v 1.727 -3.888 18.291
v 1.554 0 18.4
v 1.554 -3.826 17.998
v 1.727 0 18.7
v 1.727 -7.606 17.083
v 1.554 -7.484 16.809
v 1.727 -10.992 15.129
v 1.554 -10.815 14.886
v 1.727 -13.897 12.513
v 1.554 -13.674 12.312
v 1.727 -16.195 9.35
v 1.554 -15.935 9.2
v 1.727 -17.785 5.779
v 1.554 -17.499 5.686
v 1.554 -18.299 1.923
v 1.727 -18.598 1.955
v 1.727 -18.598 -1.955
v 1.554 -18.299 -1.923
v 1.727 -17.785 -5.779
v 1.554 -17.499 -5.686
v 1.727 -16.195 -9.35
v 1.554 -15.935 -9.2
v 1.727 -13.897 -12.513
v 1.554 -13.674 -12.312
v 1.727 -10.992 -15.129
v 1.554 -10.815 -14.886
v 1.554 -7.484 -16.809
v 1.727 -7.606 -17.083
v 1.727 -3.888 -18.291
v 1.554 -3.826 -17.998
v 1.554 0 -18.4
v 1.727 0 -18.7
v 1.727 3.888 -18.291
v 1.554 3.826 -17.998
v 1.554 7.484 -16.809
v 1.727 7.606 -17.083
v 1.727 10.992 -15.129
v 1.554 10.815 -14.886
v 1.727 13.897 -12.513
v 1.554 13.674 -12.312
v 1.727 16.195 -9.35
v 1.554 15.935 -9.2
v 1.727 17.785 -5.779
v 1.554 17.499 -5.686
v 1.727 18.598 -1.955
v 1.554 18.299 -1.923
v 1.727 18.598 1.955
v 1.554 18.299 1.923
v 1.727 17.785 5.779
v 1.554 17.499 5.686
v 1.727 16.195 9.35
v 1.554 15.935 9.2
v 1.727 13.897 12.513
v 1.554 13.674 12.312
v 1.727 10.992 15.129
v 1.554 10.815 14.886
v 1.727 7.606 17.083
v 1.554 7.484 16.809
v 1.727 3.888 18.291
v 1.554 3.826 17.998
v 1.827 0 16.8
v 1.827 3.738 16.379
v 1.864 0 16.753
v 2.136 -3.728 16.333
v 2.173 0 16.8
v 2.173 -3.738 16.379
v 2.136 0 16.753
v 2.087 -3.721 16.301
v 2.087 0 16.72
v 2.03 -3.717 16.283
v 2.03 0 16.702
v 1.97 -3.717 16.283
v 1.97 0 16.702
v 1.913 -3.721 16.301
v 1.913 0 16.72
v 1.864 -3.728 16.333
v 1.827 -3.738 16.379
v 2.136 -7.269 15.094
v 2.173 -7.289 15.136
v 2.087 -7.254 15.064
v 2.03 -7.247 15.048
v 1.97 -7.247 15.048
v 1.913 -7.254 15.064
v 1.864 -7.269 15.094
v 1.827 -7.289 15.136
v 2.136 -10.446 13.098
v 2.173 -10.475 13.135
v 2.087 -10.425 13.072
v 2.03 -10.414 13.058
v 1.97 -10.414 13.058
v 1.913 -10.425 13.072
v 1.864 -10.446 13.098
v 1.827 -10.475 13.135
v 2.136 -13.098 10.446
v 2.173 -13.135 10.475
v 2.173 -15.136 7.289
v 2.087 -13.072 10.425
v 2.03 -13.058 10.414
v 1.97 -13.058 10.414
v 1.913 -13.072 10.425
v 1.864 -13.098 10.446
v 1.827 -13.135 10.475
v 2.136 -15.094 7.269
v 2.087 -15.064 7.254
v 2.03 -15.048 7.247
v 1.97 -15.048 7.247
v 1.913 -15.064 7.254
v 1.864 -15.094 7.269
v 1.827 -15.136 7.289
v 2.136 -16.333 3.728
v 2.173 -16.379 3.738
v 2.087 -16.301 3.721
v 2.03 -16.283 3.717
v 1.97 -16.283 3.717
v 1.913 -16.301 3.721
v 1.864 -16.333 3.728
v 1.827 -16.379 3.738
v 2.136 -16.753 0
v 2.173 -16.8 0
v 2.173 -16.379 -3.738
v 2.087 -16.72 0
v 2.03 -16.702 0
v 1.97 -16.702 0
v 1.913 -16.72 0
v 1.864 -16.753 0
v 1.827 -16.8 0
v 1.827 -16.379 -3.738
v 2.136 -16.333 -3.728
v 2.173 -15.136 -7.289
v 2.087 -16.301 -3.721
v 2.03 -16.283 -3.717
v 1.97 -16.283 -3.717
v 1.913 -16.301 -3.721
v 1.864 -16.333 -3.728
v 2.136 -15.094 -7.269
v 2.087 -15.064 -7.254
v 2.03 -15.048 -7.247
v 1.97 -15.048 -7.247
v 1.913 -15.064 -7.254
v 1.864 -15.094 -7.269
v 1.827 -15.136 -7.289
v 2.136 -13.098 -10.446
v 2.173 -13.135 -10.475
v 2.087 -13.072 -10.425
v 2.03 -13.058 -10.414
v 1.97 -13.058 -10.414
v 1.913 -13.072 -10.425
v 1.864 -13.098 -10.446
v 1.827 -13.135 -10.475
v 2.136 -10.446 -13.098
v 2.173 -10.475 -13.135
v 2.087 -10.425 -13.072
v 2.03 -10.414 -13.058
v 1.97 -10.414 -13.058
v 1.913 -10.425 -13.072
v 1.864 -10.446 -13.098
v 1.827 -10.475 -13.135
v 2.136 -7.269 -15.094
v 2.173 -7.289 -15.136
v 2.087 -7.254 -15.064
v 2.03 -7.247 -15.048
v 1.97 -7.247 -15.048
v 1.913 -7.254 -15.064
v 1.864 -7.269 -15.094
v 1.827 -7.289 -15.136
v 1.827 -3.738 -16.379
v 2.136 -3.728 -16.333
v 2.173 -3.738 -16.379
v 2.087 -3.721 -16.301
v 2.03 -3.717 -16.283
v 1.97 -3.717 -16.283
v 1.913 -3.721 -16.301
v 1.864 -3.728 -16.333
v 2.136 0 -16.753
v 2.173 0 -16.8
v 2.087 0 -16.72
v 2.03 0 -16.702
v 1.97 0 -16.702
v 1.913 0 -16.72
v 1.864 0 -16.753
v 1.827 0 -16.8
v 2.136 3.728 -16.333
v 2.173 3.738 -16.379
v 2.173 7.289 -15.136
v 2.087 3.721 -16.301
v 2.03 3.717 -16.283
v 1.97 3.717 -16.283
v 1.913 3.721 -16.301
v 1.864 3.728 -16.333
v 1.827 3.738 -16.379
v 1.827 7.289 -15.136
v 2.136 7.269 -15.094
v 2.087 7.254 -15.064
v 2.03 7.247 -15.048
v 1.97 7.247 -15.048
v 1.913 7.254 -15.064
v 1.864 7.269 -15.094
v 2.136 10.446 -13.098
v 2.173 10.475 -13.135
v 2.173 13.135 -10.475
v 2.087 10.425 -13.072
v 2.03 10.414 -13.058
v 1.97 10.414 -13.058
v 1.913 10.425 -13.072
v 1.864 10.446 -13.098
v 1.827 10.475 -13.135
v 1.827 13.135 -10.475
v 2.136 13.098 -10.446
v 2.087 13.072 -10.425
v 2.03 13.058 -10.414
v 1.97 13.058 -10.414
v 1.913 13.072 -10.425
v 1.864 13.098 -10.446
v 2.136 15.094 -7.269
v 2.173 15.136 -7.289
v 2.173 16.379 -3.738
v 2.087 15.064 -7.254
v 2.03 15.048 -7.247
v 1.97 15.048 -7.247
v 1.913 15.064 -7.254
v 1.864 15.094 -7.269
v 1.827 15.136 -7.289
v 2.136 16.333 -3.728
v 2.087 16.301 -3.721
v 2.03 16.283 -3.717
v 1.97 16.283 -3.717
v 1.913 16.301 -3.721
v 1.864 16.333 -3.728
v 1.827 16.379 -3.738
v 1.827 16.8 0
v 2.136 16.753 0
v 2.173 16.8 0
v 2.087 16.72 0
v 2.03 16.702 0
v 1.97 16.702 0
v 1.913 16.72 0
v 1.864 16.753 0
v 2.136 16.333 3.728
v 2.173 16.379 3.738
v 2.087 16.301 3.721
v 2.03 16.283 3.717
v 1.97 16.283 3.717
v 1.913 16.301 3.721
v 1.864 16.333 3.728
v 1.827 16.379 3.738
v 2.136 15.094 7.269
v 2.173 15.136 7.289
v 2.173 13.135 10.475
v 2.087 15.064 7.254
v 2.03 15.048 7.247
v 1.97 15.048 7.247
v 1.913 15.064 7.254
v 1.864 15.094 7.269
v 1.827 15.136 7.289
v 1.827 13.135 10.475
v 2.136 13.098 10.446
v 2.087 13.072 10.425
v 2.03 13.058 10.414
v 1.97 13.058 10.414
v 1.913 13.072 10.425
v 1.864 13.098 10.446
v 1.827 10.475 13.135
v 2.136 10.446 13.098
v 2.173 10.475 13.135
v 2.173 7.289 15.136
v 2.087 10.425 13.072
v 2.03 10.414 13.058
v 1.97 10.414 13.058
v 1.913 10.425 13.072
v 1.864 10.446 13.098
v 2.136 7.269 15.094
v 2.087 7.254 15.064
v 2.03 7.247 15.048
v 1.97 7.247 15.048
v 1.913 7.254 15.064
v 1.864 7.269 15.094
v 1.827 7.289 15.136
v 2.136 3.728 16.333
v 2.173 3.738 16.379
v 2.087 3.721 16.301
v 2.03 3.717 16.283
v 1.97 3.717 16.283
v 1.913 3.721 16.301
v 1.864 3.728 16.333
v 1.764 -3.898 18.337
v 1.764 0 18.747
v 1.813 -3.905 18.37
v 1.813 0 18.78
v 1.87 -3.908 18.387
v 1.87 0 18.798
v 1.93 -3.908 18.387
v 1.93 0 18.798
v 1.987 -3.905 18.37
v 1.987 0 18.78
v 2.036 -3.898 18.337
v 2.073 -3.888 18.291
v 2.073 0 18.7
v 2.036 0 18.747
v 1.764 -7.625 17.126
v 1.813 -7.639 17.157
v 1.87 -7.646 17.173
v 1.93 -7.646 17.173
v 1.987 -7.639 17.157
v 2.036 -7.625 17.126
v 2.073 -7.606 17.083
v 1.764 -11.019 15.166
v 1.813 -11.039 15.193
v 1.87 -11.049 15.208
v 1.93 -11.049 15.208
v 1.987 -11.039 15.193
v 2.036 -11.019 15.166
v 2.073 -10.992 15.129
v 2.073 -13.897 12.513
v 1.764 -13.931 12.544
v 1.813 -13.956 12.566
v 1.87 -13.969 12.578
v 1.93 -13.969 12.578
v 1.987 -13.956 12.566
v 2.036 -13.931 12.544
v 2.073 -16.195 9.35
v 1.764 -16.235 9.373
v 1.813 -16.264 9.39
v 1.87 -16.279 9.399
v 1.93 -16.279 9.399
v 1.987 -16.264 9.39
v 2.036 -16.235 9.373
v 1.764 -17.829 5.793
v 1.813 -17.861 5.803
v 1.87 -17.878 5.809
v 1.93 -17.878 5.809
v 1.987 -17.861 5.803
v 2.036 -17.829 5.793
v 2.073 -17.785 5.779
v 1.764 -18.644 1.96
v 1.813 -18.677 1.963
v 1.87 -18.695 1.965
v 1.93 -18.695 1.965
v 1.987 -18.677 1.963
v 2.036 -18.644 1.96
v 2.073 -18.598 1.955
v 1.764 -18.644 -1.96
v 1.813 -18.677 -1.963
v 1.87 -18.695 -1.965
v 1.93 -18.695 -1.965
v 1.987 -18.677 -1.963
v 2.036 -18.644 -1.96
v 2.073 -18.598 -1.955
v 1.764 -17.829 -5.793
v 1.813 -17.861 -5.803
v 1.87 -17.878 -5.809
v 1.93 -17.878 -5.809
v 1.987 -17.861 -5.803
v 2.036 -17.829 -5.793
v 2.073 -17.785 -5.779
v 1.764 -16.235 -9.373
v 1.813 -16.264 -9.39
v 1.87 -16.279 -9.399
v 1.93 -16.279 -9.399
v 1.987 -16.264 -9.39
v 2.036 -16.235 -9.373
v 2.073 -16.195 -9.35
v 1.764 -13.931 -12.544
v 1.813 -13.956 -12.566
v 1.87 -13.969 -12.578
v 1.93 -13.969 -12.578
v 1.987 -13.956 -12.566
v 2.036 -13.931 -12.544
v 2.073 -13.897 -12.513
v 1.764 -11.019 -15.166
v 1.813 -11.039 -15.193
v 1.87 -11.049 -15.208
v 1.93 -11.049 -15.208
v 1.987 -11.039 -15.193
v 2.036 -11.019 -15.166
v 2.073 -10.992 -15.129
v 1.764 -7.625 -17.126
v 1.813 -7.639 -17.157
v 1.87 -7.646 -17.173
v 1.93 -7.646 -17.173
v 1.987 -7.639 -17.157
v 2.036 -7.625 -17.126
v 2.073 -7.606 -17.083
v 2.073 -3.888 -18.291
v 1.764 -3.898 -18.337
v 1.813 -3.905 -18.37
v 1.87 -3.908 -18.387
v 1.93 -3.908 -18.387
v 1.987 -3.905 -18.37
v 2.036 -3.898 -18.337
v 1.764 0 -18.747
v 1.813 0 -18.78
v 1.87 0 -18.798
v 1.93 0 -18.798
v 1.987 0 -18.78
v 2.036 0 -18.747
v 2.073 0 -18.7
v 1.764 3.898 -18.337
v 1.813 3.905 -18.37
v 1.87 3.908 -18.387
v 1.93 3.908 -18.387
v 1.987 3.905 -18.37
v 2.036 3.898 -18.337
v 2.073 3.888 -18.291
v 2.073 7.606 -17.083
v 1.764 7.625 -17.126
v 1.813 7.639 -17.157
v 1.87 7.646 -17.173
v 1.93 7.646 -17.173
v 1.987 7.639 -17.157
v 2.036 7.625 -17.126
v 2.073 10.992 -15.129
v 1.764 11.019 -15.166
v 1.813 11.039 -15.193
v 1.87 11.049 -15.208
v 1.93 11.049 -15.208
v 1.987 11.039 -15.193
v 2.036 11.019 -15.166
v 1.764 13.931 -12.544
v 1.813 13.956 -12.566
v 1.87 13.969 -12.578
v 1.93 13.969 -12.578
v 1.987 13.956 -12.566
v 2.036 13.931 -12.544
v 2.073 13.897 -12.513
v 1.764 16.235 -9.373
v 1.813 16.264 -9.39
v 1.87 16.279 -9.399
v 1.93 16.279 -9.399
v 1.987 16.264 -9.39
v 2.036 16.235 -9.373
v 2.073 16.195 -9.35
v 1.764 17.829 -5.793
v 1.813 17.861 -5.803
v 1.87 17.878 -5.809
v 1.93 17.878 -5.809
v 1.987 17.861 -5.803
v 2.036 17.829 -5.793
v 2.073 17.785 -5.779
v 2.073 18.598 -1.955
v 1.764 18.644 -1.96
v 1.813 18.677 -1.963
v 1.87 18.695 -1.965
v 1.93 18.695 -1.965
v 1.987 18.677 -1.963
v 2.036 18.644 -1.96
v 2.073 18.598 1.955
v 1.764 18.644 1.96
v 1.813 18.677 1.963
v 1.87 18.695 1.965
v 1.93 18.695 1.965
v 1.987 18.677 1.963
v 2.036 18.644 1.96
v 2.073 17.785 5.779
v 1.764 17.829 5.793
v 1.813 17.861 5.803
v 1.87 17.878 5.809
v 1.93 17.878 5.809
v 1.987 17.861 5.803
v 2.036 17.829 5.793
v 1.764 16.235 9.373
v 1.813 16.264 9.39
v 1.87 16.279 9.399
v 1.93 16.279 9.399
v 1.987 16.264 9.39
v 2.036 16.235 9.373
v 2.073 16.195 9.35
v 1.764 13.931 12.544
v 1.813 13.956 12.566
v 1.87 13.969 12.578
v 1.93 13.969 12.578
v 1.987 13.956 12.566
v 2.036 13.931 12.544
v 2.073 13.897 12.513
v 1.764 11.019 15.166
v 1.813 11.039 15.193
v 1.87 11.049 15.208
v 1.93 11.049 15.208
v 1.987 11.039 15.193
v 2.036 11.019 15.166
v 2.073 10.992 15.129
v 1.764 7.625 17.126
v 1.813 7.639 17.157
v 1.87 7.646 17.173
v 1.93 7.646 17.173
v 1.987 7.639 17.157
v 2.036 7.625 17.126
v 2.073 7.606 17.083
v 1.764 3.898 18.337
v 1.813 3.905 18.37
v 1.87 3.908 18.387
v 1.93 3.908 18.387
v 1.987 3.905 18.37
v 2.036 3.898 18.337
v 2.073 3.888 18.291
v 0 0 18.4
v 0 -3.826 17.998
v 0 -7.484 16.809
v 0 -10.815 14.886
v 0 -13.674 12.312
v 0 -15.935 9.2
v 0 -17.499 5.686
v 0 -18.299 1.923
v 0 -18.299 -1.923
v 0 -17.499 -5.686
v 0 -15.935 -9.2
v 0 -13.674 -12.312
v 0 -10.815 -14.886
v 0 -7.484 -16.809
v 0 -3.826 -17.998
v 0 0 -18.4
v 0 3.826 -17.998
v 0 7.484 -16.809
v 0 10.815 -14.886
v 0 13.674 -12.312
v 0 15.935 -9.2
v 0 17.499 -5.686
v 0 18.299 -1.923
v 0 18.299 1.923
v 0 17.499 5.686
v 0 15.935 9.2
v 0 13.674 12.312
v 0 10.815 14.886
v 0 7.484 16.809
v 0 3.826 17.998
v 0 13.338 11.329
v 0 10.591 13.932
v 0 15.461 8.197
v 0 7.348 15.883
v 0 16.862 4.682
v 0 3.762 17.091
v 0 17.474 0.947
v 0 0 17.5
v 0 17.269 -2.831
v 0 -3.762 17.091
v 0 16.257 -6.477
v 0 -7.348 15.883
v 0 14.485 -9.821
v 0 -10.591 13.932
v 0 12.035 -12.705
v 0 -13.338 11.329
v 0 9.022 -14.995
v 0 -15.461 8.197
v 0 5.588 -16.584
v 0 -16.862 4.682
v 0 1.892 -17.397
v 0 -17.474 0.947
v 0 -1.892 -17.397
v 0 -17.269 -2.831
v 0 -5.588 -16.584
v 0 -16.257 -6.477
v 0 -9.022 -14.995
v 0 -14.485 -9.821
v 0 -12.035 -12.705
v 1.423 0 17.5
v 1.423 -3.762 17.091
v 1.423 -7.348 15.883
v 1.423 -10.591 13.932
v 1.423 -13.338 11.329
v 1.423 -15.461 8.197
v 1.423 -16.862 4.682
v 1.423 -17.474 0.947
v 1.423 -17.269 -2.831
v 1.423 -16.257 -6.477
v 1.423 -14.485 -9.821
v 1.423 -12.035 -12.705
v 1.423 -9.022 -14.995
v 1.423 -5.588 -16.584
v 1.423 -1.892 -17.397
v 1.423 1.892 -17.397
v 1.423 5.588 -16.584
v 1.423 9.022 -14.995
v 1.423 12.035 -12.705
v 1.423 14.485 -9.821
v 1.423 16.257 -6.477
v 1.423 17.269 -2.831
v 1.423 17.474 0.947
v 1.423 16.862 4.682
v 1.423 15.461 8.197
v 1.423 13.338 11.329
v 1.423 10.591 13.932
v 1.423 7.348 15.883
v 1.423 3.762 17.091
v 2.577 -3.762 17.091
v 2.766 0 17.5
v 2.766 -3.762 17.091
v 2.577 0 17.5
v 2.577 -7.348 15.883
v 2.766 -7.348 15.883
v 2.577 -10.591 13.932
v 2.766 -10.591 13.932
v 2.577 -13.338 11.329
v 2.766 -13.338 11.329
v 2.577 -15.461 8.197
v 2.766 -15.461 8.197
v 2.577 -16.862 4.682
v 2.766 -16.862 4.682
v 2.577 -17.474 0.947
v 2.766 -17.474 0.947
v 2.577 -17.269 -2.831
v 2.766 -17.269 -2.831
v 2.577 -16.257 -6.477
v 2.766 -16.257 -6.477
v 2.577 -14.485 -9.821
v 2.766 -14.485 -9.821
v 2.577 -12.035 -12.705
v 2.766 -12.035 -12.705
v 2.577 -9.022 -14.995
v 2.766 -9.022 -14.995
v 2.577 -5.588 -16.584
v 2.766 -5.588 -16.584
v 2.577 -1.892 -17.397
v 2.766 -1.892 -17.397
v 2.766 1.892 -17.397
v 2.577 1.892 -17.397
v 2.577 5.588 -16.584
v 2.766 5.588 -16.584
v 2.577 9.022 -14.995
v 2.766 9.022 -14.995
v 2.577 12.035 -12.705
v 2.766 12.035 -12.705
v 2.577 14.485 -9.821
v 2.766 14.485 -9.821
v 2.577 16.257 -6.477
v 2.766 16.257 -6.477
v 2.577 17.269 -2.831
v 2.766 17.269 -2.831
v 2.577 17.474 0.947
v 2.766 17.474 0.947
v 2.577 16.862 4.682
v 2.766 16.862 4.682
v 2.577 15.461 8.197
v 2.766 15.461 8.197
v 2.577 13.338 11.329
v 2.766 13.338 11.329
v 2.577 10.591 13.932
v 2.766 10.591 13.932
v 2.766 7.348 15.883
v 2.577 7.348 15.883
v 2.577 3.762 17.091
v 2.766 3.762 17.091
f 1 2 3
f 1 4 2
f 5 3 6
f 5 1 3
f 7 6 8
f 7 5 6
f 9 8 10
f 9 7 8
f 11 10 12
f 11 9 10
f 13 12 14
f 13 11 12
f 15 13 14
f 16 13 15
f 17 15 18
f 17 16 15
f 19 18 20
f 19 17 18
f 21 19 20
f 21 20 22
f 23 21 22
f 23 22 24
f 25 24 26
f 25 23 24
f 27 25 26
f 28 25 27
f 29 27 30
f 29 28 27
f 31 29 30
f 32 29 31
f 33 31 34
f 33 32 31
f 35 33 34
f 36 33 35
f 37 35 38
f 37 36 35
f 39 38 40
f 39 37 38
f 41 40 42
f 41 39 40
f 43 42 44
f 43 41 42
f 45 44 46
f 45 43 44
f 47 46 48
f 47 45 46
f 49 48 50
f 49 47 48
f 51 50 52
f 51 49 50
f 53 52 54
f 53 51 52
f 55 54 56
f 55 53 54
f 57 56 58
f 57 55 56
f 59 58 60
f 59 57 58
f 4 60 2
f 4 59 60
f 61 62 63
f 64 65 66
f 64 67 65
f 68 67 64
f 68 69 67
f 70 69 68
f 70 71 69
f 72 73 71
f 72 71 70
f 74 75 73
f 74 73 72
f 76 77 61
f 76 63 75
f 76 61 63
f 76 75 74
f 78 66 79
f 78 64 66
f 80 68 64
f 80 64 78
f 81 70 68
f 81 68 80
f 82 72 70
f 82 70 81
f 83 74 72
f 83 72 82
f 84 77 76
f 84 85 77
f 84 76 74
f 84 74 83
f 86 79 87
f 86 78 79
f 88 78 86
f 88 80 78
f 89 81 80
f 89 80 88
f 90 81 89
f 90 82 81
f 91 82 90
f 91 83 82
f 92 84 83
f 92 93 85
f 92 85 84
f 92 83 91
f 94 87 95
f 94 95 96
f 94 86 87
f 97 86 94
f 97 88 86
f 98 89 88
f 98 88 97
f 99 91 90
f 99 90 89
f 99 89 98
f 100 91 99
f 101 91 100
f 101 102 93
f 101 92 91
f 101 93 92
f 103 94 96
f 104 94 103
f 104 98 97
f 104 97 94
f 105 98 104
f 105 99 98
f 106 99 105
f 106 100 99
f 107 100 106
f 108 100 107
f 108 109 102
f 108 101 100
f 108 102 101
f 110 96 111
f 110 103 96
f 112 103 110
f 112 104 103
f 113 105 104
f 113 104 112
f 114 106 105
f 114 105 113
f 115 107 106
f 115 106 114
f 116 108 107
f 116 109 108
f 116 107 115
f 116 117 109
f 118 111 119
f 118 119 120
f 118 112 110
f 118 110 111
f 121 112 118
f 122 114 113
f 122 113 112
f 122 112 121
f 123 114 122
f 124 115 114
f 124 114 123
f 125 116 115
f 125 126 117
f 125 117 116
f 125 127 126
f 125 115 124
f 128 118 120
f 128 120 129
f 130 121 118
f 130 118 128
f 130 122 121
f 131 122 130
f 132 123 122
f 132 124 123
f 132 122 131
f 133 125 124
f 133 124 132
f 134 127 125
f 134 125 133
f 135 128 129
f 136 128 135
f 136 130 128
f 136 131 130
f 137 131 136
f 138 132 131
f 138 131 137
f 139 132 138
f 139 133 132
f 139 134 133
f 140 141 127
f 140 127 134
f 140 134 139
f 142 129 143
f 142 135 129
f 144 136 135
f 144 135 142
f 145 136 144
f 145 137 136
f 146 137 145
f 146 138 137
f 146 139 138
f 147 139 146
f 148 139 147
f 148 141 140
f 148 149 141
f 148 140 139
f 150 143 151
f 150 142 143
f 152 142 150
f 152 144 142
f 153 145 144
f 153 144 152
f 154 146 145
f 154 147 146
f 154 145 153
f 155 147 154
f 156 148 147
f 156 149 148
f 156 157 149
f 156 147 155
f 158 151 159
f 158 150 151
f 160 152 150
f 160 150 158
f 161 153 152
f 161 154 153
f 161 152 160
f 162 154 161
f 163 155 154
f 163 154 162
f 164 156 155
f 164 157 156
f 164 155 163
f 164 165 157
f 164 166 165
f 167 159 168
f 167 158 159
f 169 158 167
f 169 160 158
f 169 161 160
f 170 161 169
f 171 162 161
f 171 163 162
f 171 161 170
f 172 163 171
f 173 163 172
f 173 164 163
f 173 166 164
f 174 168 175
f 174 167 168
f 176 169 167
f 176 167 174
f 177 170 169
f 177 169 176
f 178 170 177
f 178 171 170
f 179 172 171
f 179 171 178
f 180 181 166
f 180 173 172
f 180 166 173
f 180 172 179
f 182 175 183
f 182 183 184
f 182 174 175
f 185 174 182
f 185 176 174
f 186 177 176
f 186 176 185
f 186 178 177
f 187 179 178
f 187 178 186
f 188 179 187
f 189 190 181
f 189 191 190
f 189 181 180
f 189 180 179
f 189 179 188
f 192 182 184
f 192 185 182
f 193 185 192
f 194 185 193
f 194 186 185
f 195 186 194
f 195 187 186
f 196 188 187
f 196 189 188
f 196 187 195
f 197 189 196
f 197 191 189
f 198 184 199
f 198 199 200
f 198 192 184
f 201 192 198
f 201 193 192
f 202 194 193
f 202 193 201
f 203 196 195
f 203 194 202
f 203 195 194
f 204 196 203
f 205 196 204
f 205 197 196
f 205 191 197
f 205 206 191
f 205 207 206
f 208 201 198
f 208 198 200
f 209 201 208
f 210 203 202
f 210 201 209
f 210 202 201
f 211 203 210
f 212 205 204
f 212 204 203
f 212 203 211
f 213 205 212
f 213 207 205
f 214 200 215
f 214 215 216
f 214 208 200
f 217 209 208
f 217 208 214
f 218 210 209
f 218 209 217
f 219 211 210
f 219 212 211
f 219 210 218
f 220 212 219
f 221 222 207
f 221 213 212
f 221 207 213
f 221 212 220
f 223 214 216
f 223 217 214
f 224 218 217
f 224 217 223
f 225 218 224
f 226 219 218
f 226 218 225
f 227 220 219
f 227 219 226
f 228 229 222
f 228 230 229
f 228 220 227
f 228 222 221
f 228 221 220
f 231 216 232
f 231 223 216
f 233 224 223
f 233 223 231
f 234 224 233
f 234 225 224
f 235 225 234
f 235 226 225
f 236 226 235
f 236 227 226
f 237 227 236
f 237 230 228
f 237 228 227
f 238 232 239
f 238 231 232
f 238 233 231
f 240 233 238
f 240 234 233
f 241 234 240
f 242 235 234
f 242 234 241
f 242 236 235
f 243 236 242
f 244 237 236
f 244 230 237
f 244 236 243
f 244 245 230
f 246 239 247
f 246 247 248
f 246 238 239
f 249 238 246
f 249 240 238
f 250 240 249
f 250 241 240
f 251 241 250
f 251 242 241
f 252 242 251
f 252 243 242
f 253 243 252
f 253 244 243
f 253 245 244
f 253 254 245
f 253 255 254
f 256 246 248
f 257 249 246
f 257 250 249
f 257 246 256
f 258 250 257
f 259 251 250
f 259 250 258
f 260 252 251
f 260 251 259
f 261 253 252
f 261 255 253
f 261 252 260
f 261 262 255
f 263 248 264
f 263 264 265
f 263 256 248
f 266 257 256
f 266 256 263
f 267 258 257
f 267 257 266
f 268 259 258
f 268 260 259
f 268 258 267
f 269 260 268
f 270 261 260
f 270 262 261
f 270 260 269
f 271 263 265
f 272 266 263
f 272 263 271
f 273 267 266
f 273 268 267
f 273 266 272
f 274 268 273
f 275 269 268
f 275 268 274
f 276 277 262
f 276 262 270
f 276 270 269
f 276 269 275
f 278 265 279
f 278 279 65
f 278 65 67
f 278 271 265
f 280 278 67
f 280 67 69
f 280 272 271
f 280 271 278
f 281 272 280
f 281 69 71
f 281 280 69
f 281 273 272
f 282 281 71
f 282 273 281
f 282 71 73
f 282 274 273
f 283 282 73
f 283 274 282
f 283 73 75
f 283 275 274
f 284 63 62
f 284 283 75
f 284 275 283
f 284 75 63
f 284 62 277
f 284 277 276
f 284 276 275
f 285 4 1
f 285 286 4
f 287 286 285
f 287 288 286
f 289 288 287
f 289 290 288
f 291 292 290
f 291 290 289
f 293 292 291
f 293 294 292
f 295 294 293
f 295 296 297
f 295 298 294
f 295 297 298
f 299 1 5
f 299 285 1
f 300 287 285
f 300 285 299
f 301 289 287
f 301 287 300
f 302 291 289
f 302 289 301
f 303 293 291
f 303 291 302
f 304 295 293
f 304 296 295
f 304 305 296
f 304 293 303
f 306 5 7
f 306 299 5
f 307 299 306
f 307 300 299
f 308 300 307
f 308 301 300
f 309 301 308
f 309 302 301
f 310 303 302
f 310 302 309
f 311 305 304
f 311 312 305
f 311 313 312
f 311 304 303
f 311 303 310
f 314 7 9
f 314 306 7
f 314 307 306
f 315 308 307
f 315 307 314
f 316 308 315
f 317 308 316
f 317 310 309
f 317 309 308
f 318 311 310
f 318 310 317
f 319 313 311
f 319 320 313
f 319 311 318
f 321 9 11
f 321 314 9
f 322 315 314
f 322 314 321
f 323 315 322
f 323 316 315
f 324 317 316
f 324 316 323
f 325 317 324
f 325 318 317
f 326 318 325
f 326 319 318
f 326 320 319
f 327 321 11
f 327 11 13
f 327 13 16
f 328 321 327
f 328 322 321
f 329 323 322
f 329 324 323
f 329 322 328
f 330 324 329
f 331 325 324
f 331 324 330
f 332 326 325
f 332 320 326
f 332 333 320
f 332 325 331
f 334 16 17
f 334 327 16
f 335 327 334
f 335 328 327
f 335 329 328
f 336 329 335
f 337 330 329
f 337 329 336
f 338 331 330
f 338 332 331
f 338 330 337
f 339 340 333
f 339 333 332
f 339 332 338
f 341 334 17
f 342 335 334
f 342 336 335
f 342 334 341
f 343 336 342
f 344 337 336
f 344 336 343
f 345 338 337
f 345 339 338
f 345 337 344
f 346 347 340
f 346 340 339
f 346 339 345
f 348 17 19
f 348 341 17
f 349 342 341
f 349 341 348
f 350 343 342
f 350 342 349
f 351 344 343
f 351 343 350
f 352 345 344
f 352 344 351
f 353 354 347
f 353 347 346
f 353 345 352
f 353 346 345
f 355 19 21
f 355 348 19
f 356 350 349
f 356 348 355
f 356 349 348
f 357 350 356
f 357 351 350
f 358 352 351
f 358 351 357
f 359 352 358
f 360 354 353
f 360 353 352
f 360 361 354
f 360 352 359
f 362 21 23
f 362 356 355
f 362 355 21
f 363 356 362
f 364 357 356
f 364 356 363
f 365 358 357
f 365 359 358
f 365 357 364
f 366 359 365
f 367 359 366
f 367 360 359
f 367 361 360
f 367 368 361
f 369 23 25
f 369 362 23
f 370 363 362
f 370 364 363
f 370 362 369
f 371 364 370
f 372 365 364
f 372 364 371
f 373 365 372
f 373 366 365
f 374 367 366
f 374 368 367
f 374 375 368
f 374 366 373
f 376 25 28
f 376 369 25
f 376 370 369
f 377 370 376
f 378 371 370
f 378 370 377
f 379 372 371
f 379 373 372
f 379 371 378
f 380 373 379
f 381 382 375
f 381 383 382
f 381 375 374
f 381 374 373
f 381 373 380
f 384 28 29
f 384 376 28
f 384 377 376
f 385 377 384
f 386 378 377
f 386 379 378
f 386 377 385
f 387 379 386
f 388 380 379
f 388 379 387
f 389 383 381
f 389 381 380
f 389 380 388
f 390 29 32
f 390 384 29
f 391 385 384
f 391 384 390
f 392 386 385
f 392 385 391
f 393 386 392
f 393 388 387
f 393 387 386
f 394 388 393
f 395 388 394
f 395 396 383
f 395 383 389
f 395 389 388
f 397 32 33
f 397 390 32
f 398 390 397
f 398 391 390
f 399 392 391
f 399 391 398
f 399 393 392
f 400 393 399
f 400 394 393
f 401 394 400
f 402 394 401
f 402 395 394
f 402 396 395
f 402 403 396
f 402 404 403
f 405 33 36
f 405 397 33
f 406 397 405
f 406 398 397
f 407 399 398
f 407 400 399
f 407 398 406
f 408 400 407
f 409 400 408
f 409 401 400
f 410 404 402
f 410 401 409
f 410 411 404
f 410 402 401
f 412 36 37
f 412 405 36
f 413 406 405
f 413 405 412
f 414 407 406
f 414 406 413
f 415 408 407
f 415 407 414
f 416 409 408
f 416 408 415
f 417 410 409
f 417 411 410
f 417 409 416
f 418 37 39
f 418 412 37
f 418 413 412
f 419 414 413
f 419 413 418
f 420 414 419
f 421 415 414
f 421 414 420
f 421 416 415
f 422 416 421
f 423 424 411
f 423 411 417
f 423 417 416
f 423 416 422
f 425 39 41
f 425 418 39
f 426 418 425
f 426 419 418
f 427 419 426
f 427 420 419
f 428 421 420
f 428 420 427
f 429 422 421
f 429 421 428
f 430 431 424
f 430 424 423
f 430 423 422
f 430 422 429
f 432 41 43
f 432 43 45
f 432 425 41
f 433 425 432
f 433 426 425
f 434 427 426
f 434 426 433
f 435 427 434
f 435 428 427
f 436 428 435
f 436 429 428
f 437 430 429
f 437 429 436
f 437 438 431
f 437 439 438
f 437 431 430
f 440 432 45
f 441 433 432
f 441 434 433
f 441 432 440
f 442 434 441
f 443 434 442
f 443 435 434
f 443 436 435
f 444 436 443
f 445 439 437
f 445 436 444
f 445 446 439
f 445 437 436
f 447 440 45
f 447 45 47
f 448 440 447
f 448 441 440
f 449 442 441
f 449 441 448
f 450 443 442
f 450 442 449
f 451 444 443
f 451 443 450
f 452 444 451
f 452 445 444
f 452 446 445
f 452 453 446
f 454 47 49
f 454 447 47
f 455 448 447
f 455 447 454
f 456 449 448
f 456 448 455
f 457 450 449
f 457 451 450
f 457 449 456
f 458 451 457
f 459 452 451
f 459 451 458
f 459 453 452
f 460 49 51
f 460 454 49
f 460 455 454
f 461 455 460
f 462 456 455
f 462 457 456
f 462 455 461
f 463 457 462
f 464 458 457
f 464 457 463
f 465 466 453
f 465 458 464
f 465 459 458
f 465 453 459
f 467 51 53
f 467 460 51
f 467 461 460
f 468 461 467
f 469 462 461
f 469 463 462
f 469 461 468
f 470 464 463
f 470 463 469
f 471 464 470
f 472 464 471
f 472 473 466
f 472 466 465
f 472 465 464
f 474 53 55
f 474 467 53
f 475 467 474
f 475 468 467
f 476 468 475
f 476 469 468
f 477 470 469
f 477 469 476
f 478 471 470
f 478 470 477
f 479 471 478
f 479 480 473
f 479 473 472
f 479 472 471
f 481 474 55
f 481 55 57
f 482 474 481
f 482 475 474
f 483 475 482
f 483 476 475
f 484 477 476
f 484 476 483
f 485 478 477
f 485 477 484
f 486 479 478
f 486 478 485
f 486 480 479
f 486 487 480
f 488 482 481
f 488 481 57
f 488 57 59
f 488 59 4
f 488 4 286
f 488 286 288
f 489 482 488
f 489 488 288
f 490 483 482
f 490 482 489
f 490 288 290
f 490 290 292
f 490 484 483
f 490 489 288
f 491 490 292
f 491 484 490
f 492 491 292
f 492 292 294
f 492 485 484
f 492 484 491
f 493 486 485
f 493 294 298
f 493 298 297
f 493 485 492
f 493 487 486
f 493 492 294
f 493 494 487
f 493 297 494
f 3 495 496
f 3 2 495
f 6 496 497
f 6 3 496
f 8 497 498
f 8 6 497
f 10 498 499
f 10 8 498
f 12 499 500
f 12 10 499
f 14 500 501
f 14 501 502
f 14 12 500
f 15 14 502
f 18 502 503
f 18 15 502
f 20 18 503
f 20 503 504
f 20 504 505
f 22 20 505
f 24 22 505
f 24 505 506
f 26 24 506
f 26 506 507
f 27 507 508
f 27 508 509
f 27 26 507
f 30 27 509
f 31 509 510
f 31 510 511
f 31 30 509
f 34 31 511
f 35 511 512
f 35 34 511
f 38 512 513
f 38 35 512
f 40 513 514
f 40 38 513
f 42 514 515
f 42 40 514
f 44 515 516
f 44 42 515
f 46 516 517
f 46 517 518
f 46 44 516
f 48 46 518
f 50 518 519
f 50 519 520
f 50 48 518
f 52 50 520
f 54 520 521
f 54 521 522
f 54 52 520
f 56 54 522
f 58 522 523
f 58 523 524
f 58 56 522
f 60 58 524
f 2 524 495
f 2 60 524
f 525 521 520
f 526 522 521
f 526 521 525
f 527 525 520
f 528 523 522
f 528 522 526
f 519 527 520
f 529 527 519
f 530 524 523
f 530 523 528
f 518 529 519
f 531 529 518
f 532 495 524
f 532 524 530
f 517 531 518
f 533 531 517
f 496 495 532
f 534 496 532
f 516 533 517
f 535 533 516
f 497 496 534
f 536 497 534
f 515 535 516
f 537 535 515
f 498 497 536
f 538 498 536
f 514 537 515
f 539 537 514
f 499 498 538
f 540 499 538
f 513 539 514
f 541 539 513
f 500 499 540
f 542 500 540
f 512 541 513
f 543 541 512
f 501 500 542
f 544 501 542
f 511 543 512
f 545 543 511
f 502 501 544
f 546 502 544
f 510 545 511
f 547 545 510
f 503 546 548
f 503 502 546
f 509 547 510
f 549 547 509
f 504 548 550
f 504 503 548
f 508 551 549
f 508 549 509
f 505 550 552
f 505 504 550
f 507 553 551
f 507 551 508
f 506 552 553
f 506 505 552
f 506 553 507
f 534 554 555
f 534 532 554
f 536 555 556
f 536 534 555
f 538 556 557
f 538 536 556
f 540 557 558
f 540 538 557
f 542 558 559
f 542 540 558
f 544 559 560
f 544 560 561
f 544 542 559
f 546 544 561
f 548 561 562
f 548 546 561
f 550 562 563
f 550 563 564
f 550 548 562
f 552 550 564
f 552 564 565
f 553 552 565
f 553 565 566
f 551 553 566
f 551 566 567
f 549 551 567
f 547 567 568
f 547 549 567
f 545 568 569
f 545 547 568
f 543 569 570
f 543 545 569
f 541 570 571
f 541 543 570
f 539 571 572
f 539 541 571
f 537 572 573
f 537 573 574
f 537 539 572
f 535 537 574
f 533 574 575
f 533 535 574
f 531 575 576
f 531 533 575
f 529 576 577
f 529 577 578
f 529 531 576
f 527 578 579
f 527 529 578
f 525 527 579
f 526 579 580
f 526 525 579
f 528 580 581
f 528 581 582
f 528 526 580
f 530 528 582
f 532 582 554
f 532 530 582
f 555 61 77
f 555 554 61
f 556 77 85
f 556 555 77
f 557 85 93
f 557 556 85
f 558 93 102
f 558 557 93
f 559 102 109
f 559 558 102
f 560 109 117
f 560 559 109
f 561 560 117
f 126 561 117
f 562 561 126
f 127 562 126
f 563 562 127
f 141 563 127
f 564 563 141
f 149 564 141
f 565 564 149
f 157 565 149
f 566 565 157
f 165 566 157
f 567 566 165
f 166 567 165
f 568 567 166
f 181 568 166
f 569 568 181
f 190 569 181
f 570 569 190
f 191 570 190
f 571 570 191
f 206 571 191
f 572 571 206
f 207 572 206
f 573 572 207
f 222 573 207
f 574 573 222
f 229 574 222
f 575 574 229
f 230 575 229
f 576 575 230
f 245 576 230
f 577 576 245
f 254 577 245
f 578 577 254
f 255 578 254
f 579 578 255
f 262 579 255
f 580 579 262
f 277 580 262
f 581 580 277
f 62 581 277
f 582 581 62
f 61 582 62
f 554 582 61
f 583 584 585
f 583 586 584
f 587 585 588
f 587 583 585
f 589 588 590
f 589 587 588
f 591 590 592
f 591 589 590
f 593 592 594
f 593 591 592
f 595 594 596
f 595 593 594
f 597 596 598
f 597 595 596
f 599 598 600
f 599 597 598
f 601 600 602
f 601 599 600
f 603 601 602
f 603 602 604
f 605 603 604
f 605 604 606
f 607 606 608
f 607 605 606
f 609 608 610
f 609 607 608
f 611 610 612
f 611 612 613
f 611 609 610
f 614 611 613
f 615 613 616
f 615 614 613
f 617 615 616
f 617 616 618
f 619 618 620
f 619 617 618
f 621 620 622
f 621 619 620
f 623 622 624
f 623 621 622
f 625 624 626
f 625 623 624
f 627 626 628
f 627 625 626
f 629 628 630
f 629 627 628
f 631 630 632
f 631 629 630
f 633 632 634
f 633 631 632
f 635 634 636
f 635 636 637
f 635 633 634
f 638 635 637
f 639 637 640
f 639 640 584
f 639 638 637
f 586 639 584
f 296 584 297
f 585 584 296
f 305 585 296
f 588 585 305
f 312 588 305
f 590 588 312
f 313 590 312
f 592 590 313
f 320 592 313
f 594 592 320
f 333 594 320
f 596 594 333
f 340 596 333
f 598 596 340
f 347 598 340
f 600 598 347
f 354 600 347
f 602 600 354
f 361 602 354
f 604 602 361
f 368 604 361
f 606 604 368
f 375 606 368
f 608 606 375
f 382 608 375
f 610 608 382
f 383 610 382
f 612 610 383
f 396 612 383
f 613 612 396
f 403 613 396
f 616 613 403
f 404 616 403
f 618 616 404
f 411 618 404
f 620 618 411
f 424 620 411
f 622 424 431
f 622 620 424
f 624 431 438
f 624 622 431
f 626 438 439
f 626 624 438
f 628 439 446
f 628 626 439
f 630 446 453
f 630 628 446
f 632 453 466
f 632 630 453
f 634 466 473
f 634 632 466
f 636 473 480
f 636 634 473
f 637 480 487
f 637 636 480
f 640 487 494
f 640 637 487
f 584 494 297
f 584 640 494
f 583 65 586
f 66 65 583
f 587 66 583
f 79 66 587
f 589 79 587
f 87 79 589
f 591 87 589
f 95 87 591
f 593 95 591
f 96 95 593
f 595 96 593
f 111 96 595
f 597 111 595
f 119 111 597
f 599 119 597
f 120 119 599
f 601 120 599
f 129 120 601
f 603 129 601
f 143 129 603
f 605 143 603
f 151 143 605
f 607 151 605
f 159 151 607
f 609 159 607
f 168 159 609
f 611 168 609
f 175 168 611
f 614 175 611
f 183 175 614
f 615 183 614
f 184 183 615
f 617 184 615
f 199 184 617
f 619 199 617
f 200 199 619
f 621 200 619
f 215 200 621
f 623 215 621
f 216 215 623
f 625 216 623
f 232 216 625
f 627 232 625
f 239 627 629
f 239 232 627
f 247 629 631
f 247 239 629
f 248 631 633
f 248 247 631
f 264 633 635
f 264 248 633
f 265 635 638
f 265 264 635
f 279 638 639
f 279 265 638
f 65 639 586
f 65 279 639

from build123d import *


with BuildPart() as part:
    # Эскиз1 → Повернуть1 (revolve)
    with BuildSketch(Plane.XY, mode=Mode.PRIVATE) as revolve_1_sk:
        with BuildLine():
            Line((0, 18.4), (1.553589838, 18.4))
            Line((1.553589838, 18.4), (1.726794919, 18.7))
            ThreePointArc((1.726794919, 18.7), (1.9, 18.8), (2.073205081, 18.7))
            Line((2.073205081, 18.7), (2.766025404, 17.5))
            Line((2.766025404, 17.5), (2.577350269, 17.5))
            Line((2.577350269, 17.5), (2.173205081, 16.8))
            ThreePointArc((2.173205081, 16.8), (2, 16.7), (1.826794919, 16.8))
            Line((1.826794919, 16.8), (1.422649731, 17.5))
            Line((1.422649731, 17.5), (0, 17.5))
            Line((0, 17.5), (0, 18.4))
        make_face()
    revolve(revolve_1_sk.sketch.rotate(Axis((0, 0, 0), (1, 0, 0)), 90), axis=Axis((0, 0, 0), (1, 0, 0)))


solid = part.part
